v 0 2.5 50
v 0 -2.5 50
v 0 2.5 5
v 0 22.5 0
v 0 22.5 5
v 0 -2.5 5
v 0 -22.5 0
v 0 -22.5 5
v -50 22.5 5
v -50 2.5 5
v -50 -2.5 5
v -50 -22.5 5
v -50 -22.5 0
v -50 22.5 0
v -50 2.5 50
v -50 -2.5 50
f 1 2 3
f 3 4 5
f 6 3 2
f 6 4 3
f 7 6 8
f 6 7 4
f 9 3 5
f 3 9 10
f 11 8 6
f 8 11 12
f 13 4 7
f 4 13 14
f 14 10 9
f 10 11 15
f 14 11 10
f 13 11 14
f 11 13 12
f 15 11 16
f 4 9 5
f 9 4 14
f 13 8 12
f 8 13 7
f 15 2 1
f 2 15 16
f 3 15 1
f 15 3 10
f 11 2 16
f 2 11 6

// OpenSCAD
// Built by bench/smallmodels/features/compiler.py from a list of features.
$fn = 64;
difference() {
  union() {
    translate([-25, 0, 0]) translate([-25, -22.5, 0]) cube([50, 45, 5]);
    translate([-25, 0, 0]) translate([-25, -2.5, 0]) cube([50, 5, 50]);
  }
  union() {
    translate([-17, 30, 1.25]) rotate([0, 0, 0]) rotate([0, 90, 0]) cylinder(d = 4.5, h = 1200, center = true);
    translate([17, 30, 1.25]) rotate([0, 0, 0]) rotate([0, 90, 0]) cylinder(d = 4.5, h = 1200, center = true);
  }
}
difference() {
  union() {
    translate([-25, 0, 0]) translate([-25, -2.5, 0]) cube([50, 5, 50]);
  }
  union() {
    translate([0, 2.5, 44.99]) rotate([0, 0, 0]) cylinder(d = 23, h = 5.02);
    translate([0, 0, 28]) rotate([0, 0, 0]) translate([-1.7, -15.5, 0]) cube([3.4, 31, 50]);
    translate([-15.5, 15.5, 28]) rotate([0, 0, 90]) translate([-1.7, -15.5, 0]) cube([3.4, 31, 50]);
    translate([-31, 0, 28]) rotate([0, 0, 180]) translate([-1.7, -15.5, 0]) cube([3.4, 31, 50]);
    translate([-15.5, -15.5, 28]) rotate([0, 0, 270]) translate([-1.7, -15.5, 0]) cube([3.4, 31, 50]);
  }
}
